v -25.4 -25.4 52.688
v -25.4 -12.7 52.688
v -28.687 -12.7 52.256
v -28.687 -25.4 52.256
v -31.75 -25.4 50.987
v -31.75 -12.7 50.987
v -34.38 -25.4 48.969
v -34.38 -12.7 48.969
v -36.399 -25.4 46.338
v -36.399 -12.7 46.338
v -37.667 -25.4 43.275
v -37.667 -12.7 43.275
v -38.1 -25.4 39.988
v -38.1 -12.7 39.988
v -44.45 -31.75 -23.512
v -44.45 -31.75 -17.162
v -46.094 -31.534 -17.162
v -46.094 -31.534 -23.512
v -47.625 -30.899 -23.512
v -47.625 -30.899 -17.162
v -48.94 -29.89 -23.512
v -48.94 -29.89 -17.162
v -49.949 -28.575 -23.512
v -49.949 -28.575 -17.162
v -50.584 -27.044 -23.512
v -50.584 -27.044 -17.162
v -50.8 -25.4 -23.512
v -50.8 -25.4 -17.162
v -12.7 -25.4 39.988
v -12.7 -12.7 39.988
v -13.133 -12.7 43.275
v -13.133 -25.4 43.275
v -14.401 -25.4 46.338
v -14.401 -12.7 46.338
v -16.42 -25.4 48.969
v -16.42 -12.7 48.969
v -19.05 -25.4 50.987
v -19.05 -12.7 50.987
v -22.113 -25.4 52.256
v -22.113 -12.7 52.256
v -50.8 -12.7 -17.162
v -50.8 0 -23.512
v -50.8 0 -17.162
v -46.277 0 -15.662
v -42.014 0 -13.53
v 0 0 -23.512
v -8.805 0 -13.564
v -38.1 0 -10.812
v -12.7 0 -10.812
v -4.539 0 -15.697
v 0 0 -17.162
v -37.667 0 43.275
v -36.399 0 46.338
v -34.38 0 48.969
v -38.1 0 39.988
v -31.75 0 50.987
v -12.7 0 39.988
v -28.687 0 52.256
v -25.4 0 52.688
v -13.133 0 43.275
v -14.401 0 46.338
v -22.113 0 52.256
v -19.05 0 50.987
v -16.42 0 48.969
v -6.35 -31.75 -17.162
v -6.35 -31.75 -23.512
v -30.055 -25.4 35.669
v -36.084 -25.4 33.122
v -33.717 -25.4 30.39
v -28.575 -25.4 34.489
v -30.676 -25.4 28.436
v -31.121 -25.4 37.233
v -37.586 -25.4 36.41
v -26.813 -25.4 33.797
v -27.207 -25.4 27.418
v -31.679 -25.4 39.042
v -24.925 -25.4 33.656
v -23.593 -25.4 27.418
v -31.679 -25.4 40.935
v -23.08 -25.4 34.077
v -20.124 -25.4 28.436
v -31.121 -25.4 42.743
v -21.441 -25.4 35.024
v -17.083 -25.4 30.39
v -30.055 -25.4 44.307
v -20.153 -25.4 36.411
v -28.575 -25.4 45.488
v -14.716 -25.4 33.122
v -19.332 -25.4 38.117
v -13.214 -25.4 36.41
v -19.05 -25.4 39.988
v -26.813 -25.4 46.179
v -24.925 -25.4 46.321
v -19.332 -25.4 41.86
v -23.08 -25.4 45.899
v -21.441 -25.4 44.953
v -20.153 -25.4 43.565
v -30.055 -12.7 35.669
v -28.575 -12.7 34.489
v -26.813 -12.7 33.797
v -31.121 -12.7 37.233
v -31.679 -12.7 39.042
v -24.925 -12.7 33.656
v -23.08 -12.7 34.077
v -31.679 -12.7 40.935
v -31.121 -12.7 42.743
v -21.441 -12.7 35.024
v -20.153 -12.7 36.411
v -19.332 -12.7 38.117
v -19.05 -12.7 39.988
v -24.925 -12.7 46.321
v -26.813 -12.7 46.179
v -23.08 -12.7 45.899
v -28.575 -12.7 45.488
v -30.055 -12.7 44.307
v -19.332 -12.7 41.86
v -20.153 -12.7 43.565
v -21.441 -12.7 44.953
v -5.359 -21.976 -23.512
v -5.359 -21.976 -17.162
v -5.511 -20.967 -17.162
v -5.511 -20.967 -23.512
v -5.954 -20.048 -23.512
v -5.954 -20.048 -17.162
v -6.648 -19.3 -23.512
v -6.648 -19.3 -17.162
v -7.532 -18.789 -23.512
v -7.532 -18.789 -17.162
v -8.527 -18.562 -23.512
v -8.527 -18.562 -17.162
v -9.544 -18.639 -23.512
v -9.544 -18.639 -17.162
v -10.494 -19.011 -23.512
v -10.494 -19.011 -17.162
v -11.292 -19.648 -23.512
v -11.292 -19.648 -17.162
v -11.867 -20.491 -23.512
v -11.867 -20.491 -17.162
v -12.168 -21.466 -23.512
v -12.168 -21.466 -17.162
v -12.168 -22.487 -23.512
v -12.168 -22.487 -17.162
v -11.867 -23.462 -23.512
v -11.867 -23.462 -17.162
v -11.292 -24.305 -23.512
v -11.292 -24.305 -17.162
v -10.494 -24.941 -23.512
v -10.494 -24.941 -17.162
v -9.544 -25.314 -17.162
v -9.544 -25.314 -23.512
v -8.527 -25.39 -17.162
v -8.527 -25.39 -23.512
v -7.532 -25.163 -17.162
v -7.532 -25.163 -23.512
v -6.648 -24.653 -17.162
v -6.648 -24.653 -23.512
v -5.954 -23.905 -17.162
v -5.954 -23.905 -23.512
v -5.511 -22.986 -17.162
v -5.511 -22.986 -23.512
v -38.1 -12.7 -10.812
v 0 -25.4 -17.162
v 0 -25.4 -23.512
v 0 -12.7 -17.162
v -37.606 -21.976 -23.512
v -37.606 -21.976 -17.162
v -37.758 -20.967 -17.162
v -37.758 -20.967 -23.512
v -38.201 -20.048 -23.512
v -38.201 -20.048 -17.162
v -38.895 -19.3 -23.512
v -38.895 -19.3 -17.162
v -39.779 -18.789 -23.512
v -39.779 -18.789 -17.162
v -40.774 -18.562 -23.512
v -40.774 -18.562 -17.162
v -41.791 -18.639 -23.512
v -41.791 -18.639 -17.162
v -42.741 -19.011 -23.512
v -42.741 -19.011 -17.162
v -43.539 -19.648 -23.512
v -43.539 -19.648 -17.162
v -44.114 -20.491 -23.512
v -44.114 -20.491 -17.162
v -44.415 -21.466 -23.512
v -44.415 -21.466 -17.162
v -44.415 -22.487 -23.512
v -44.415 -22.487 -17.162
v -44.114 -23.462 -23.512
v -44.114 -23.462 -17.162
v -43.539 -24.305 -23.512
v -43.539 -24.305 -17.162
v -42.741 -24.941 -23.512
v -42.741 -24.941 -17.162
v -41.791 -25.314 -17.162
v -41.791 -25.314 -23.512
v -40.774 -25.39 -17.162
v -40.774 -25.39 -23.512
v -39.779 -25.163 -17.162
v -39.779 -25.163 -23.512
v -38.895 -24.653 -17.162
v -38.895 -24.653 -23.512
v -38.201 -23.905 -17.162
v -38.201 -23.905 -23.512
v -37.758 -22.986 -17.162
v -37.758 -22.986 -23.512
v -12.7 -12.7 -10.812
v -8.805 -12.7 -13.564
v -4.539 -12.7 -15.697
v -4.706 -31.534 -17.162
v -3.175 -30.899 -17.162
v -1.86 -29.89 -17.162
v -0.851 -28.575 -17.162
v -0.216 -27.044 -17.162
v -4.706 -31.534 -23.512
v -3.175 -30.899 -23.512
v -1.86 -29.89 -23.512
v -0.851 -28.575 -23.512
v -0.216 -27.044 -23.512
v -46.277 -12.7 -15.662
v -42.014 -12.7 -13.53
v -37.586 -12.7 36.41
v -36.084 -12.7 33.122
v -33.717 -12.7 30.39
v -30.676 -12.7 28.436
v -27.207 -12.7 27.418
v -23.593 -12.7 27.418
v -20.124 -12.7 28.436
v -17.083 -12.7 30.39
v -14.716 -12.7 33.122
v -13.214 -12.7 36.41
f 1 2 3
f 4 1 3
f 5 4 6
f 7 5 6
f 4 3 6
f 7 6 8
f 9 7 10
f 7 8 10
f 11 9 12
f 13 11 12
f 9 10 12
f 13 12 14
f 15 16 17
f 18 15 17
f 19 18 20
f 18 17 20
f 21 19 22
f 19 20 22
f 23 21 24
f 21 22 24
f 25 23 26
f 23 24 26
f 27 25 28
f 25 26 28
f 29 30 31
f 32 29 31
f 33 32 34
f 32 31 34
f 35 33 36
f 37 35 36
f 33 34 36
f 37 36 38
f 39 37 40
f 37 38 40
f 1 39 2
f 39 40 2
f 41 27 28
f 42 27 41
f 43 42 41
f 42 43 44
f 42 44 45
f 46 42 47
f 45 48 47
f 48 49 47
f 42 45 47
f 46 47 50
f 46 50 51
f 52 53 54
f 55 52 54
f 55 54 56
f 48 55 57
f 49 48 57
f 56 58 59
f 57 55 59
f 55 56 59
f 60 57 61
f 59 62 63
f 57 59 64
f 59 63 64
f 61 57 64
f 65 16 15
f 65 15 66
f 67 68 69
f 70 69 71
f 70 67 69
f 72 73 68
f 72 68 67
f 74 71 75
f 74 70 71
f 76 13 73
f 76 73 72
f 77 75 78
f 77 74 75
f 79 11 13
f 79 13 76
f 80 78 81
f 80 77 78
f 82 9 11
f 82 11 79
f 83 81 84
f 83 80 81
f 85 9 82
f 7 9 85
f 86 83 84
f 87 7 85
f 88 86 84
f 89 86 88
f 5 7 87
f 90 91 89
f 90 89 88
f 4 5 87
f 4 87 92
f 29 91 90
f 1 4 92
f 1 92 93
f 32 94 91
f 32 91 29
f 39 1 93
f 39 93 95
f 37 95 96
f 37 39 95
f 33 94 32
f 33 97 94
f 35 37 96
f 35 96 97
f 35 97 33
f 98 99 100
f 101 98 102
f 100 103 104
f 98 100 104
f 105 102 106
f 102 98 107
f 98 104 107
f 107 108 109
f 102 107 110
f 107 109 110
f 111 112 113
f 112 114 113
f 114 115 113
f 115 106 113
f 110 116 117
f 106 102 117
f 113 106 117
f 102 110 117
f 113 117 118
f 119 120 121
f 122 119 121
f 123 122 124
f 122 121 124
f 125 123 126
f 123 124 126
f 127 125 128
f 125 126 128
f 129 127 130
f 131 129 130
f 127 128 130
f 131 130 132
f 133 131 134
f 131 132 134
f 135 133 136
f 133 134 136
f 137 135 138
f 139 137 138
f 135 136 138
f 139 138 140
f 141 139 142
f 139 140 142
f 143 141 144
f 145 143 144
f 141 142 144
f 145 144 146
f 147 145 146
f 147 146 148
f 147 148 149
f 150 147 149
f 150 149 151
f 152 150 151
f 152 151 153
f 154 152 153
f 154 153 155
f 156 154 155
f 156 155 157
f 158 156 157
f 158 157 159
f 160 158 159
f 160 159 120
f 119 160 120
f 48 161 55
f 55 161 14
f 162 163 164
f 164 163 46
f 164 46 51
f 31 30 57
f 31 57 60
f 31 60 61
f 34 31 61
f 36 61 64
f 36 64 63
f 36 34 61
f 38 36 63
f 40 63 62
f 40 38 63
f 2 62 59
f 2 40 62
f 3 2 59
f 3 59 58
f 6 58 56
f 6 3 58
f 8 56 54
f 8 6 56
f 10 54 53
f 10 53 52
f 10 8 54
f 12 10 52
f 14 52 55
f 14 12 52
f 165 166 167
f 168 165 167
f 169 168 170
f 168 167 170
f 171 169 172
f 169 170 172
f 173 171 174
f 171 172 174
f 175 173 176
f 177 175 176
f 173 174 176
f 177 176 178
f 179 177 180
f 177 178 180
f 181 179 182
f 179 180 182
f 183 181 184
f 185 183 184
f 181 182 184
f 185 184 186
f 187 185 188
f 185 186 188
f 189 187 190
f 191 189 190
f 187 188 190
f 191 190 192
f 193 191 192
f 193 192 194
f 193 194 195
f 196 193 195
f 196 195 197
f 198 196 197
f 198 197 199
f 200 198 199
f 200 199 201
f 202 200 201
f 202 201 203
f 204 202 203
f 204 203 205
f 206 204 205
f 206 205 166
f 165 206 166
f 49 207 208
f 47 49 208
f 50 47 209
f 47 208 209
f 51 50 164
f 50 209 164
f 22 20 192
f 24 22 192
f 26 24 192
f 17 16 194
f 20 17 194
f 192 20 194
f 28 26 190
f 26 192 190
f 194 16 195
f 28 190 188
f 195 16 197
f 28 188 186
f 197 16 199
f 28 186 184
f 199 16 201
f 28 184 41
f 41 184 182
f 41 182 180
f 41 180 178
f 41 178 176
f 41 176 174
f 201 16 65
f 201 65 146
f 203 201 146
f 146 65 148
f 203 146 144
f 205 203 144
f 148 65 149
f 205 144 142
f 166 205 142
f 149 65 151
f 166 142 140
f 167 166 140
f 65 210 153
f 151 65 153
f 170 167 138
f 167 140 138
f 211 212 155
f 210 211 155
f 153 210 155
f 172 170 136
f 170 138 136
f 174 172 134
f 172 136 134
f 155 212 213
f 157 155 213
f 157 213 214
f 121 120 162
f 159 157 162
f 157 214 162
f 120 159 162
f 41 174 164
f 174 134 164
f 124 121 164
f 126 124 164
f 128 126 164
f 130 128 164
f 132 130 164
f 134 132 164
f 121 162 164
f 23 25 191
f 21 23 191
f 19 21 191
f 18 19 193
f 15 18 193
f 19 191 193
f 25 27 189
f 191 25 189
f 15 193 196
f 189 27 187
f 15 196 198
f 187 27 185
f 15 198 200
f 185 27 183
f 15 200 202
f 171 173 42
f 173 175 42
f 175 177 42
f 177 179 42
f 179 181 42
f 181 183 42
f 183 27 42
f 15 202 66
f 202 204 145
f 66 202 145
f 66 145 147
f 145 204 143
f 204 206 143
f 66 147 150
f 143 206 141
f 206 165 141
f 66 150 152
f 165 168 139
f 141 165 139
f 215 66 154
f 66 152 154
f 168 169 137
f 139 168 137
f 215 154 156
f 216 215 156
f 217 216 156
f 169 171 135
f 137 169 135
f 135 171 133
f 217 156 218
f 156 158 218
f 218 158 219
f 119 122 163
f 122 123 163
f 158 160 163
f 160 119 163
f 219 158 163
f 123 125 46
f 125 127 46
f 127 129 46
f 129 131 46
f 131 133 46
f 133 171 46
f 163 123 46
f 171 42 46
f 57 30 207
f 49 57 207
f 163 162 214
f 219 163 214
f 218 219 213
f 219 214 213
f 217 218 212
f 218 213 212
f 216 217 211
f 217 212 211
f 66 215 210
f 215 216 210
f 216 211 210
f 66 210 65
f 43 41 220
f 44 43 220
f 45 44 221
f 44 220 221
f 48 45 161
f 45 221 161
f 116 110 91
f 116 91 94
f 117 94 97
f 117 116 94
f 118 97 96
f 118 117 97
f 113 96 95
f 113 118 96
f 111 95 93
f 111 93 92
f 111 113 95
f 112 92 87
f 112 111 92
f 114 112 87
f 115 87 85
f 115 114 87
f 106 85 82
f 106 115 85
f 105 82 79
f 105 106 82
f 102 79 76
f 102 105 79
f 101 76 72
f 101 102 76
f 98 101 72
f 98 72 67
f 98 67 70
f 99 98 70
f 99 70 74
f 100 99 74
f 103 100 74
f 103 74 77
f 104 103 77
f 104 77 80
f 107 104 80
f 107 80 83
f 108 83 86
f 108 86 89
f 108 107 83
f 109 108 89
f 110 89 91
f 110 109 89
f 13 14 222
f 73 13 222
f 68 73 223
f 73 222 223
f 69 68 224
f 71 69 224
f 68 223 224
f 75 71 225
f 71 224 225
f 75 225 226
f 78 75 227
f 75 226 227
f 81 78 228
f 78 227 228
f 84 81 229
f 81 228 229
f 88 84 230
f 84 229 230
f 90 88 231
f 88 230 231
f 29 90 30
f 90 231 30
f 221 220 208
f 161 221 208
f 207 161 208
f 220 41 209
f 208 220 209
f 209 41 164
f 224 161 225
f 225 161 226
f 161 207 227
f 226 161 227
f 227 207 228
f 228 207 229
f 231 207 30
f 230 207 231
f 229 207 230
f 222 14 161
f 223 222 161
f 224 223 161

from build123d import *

# Parameters (mm, degrees)
F0_W      = 50.8
F0_H      = 76.2
F1_DEPTH  = 31.75
F2_W      = 19.05
F2_H      = 69.85
F3_DEPTH  = 50.8
F5_DEPTH  = 25.4
F6_R      = 6.35
F7_DEPTH  = 12.7
F8_DEPTH  = 25.4
F9_R      = 3.4236002905
F10_DEPTH = 25.4


with BuildPart() as f1:
    # F0 (on Front) → F1 (new body)
    with BuildSketch(Plane.XZ):
        with Locations((-25.4, 14.5882895922)):
            Rectangle(F0_W, F0_H)
    extrude(amount=F1_DEPTH)

    # F2 (on face) → F3 (cut)
    with BuildSketch(Plane.YZ):
        with Locations((-22.225, 17.7632895922)):
            Rectangle(F2_W, F2_H)
    extrude(amount=-F3_DEPTH, mode=Mode.SUBTRACT)

    # F4 (on face) → F5 (cut)
    with BuildSketch(Plane.XZ.offset(12.7)):
        with BuildLine():
            Line((-50.8, 52.6882895922), (-50.8, -17.1617104078))
            ThreePointArc((-50.8, -17.1617104078), (-44.1071699177, -14.6723705724), (-38.1, -10.8117104078))
            Line((-38.1, -10.8117104078), (-38.1, 52.6882895922))
            Line((-38.1, 52.6882895922), (-50.8, 52.6882895922))
        make_face()
        with BuildLine():
            Line((-12.7, 52.6882895922), (-12.7, -10.8117104078))
            ThreePointArc((-12.7, -10.8117104078), (-6.7122595502, -14.7112295081), (0, -17.1617104078))
            Line((0, -17.1617104078), (0, 52.6882895922))
            Line((0, 52.6882895922), (-12.7, 52.6882895922))
        make_face()
    extrude(amount=-F5_DEPTH, mode=Mode.SUBTRACT)

    # F6 (on face) → F7 (join)
    with BuildSketch(Plane.XZ.offset(12.7)):
        with BuildLine():
            ThreePointArc((-38.1, 39.9882895922), (-25.4, 27.2882895922), (-12.7, 39.9882895922))
            ThreePointArc((-12.7, 39.9882895922), (-16.4197438789, 48.9685457133), (-25.4, 52.6882895922))
            ThreePointArc((-25.4, 52.6882895922), (-34.3802561211, 48.9685457133), (-38.1, 39.9882895922))
        make_face()
        with Locations((-25.4, 39.9882895922)):
            Circle(F6_R, mode=Mode.SUBTRACT)
    extrude(amount=F7_DEPTH)

    # F8 (cut): faces of the model
    f8_faces = [f1.faces().sort_by_distance(p)[0] for p in [
        (-35.2632271754, -12.7, 49.8515167676),
        (-15.5367728246, -12.7, 49.8515167676),
    ]]
    extrude(f8_faces, amount=-F8_DEPTH, mode=Mode.SUBTRACT)

    # F9 (on face) → F10 (cut)
    with BuildSketch(Plane.XY.offset(-17.1617104078)):
        with Locations((-41.0295619067, -21.9763997095)):
            Circle(F9_R)
        with Locations((-8.7823613257, -21.9763997095)):
            Circle(F9_R)
        with BuildLine():
            Line((-50.8, -31.75), (-44.45, -31.75))
            ThreePointArc((-44.45, -31.75), (-48.9401280605, -29.8901280605), (-50.8, -25.4))
            Line((-50.8, -25.4), (-50.8, -31.75))
        make_face()
        with BuildLine():
            ThreePointArc((0, -25.4), (-1.8598719395, -29.8901280605), (-6.35, -31.75))
            Line((-6.35, -31.75), (0, -31.75))
            Line((0, -31.75), (0, -25.4))
        make_face()
    extrude(amount=-F10_DEPTH, mode=Mode.SUBTRACT)


solid = f1.part
